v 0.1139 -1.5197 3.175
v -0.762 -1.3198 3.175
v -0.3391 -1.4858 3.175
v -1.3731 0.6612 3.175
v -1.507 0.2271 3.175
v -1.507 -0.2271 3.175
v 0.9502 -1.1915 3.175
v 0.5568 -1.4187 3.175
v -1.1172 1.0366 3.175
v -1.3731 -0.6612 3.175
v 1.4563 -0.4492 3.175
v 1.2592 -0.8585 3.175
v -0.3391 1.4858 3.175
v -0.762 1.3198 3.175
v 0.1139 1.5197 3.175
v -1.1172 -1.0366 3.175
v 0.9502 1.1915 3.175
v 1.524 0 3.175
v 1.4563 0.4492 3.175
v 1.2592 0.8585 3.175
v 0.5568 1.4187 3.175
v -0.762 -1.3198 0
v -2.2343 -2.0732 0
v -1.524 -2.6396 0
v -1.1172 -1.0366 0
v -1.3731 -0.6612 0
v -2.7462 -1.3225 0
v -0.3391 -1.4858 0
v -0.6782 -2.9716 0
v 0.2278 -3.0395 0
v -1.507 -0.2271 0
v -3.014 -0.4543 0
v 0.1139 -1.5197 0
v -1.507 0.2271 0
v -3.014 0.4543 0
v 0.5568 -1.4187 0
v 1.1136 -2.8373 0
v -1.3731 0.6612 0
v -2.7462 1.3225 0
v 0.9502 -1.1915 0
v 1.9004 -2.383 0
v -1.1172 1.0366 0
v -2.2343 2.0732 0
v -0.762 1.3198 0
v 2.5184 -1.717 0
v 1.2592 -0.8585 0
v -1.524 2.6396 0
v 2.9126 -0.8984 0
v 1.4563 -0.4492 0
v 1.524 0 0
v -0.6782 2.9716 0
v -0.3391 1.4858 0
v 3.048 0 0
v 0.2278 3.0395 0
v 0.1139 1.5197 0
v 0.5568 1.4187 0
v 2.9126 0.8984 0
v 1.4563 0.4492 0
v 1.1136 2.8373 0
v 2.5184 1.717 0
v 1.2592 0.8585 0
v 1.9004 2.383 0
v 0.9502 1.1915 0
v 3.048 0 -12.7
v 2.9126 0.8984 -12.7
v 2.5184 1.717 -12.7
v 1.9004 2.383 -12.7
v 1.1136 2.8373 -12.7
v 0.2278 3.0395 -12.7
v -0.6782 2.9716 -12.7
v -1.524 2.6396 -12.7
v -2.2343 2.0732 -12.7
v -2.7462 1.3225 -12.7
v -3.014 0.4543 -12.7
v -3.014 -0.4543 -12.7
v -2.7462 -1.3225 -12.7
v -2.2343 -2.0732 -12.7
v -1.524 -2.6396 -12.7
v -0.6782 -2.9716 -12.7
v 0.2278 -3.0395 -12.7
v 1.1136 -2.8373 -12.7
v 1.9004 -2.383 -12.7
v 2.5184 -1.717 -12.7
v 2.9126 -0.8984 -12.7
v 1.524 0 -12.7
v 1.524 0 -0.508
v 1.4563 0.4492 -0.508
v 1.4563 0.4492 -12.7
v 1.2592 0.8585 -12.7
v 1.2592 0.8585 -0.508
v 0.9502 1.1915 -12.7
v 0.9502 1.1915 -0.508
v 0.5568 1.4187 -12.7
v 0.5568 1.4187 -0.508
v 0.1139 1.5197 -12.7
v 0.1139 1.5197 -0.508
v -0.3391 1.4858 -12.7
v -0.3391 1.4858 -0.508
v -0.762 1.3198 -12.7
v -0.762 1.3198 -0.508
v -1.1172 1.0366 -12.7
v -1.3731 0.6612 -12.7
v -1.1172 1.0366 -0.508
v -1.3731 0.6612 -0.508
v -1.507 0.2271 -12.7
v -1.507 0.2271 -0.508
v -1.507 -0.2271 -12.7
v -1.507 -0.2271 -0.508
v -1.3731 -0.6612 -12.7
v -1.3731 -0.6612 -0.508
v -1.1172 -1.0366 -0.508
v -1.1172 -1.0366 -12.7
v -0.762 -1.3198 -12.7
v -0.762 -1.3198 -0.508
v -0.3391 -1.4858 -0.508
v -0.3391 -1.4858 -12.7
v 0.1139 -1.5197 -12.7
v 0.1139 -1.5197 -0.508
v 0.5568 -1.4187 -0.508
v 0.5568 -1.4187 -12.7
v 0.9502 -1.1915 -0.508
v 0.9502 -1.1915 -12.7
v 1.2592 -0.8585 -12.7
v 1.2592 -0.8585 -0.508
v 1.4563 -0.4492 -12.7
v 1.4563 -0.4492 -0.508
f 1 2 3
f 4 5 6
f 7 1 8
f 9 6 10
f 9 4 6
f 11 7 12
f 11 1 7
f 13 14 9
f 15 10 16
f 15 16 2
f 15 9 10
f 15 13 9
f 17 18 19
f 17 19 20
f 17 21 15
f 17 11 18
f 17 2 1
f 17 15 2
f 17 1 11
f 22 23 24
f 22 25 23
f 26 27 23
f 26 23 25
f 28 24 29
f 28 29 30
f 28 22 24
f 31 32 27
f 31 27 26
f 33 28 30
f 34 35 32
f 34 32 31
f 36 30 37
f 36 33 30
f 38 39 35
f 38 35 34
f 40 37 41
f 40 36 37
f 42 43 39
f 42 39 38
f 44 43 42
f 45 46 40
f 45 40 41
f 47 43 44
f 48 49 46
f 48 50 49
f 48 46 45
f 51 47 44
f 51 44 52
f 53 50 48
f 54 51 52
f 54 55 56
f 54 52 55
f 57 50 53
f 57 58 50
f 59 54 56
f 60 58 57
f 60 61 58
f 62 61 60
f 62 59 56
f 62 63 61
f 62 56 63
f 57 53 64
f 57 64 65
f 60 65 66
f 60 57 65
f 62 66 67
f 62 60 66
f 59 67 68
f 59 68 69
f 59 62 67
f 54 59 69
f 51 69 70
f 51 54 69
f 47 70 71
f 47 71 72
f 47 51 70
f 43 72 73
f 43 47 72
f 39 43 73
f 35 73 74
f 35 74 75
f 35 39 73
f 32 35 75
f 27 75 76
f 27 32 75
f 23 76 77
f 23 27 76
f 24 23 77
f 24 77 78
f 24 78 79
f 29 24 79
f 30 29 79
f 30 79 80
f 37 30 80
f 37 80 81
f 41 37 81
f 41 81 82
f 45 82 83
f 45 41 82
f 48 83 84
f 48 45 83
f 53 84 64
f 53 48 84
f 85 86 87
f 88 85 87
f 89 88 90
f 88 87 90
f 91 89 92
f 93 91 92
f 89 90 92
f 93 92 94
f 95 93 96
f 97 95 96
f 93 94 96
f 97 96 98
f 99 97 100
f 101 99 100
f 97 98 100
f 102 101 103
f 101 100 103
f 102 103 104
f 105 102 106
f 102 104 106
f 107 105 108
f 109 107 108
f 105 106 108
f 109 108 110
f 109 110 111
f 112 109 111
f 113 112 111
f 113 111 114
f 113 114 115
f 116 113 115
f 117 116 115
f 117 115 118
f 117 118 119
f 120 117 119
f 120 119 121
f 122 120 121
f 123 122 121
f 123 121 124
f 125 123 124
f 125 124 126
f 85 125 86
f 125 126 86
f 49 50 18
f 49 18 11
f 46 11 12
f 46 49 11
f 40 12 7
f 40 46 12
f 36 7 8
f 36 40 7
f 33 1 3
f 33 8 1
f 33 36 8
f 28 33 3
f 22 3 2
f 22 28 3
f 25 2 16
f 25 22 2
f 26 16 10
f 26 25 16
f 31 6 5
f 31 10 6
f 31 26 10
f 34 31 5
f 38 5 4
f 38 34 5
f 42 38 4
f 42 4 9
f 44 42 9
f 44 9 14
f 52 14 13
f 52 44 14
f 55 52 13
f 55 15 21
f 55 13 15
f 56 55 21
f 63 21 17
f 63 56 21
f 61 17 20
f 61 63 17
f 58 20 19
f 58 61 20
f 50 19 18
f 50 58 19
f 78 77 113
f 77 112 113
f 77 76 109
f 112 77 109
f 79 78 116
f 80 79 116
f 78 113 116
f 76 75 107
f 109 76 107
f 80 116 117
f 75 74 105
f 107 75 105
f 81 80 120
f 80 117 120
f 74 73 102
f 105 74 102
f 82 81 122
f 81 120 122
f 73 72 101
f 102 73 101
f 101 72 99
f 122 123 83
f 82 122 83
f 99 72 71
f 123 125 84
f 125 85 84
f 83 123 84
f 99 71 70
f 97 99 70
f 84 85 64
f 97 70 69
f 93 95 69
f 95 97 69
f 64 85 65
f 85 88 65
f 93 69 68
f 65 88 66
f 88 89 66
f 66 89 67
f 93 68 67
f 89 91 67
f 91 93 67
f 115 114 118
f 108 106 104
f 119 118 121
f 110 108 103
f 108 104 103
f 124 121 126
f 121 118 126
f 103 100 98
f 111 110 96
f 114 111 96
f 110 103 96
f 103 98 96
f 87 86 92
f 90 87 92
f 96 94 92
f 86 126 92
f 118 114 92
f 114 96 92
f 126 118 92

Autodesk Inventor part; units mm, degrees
ref_plane "YZ Plane" through (0, 0, 0) normal (1, 0, 0) x (0, 1, 0)
ref_plane "XZ Plane" through (0, 0, 0) normal (0, 1, 0) x (-1, 0, 0)
ref_plane "XY Plane" through (0, 0, 0) normal (0, 0, 1) x (1, 0, 0)
sketch "Sketch1" plane through (0, 0, 0) normal (0, 0, 1) x (1, 0, 0)
  circle A0 centre (0, 0) radius 1.524
  circle A1 centre (0, 0) radius 3.048
  dimension "d0" = 3.048
  dimension "d1" = 6.096
extrude "Extrusion1" add sketch "Sketch1" against normal blind 12.7
sketch "Sketch2" plane through (0, 0, 0) normal (0, 0, 1) x (1, 0, 0)
  circle A0 centre (0, 0) radius 1.524
extrude "Extrusion2" add sketch "Sketch2" against normal blind 0.508
sketch "Sketch3" plane through (0, 0, 0) normal (0, 0, 1) x (1, 0, 0)
  circle A0 centre (0, 0) radius 1.524
  dimension "d6" = 3.048
extrude "Extrusion3" add sketch "Sketch3" along normal blind 3.175
properties part number "powerSuppStandoff"
